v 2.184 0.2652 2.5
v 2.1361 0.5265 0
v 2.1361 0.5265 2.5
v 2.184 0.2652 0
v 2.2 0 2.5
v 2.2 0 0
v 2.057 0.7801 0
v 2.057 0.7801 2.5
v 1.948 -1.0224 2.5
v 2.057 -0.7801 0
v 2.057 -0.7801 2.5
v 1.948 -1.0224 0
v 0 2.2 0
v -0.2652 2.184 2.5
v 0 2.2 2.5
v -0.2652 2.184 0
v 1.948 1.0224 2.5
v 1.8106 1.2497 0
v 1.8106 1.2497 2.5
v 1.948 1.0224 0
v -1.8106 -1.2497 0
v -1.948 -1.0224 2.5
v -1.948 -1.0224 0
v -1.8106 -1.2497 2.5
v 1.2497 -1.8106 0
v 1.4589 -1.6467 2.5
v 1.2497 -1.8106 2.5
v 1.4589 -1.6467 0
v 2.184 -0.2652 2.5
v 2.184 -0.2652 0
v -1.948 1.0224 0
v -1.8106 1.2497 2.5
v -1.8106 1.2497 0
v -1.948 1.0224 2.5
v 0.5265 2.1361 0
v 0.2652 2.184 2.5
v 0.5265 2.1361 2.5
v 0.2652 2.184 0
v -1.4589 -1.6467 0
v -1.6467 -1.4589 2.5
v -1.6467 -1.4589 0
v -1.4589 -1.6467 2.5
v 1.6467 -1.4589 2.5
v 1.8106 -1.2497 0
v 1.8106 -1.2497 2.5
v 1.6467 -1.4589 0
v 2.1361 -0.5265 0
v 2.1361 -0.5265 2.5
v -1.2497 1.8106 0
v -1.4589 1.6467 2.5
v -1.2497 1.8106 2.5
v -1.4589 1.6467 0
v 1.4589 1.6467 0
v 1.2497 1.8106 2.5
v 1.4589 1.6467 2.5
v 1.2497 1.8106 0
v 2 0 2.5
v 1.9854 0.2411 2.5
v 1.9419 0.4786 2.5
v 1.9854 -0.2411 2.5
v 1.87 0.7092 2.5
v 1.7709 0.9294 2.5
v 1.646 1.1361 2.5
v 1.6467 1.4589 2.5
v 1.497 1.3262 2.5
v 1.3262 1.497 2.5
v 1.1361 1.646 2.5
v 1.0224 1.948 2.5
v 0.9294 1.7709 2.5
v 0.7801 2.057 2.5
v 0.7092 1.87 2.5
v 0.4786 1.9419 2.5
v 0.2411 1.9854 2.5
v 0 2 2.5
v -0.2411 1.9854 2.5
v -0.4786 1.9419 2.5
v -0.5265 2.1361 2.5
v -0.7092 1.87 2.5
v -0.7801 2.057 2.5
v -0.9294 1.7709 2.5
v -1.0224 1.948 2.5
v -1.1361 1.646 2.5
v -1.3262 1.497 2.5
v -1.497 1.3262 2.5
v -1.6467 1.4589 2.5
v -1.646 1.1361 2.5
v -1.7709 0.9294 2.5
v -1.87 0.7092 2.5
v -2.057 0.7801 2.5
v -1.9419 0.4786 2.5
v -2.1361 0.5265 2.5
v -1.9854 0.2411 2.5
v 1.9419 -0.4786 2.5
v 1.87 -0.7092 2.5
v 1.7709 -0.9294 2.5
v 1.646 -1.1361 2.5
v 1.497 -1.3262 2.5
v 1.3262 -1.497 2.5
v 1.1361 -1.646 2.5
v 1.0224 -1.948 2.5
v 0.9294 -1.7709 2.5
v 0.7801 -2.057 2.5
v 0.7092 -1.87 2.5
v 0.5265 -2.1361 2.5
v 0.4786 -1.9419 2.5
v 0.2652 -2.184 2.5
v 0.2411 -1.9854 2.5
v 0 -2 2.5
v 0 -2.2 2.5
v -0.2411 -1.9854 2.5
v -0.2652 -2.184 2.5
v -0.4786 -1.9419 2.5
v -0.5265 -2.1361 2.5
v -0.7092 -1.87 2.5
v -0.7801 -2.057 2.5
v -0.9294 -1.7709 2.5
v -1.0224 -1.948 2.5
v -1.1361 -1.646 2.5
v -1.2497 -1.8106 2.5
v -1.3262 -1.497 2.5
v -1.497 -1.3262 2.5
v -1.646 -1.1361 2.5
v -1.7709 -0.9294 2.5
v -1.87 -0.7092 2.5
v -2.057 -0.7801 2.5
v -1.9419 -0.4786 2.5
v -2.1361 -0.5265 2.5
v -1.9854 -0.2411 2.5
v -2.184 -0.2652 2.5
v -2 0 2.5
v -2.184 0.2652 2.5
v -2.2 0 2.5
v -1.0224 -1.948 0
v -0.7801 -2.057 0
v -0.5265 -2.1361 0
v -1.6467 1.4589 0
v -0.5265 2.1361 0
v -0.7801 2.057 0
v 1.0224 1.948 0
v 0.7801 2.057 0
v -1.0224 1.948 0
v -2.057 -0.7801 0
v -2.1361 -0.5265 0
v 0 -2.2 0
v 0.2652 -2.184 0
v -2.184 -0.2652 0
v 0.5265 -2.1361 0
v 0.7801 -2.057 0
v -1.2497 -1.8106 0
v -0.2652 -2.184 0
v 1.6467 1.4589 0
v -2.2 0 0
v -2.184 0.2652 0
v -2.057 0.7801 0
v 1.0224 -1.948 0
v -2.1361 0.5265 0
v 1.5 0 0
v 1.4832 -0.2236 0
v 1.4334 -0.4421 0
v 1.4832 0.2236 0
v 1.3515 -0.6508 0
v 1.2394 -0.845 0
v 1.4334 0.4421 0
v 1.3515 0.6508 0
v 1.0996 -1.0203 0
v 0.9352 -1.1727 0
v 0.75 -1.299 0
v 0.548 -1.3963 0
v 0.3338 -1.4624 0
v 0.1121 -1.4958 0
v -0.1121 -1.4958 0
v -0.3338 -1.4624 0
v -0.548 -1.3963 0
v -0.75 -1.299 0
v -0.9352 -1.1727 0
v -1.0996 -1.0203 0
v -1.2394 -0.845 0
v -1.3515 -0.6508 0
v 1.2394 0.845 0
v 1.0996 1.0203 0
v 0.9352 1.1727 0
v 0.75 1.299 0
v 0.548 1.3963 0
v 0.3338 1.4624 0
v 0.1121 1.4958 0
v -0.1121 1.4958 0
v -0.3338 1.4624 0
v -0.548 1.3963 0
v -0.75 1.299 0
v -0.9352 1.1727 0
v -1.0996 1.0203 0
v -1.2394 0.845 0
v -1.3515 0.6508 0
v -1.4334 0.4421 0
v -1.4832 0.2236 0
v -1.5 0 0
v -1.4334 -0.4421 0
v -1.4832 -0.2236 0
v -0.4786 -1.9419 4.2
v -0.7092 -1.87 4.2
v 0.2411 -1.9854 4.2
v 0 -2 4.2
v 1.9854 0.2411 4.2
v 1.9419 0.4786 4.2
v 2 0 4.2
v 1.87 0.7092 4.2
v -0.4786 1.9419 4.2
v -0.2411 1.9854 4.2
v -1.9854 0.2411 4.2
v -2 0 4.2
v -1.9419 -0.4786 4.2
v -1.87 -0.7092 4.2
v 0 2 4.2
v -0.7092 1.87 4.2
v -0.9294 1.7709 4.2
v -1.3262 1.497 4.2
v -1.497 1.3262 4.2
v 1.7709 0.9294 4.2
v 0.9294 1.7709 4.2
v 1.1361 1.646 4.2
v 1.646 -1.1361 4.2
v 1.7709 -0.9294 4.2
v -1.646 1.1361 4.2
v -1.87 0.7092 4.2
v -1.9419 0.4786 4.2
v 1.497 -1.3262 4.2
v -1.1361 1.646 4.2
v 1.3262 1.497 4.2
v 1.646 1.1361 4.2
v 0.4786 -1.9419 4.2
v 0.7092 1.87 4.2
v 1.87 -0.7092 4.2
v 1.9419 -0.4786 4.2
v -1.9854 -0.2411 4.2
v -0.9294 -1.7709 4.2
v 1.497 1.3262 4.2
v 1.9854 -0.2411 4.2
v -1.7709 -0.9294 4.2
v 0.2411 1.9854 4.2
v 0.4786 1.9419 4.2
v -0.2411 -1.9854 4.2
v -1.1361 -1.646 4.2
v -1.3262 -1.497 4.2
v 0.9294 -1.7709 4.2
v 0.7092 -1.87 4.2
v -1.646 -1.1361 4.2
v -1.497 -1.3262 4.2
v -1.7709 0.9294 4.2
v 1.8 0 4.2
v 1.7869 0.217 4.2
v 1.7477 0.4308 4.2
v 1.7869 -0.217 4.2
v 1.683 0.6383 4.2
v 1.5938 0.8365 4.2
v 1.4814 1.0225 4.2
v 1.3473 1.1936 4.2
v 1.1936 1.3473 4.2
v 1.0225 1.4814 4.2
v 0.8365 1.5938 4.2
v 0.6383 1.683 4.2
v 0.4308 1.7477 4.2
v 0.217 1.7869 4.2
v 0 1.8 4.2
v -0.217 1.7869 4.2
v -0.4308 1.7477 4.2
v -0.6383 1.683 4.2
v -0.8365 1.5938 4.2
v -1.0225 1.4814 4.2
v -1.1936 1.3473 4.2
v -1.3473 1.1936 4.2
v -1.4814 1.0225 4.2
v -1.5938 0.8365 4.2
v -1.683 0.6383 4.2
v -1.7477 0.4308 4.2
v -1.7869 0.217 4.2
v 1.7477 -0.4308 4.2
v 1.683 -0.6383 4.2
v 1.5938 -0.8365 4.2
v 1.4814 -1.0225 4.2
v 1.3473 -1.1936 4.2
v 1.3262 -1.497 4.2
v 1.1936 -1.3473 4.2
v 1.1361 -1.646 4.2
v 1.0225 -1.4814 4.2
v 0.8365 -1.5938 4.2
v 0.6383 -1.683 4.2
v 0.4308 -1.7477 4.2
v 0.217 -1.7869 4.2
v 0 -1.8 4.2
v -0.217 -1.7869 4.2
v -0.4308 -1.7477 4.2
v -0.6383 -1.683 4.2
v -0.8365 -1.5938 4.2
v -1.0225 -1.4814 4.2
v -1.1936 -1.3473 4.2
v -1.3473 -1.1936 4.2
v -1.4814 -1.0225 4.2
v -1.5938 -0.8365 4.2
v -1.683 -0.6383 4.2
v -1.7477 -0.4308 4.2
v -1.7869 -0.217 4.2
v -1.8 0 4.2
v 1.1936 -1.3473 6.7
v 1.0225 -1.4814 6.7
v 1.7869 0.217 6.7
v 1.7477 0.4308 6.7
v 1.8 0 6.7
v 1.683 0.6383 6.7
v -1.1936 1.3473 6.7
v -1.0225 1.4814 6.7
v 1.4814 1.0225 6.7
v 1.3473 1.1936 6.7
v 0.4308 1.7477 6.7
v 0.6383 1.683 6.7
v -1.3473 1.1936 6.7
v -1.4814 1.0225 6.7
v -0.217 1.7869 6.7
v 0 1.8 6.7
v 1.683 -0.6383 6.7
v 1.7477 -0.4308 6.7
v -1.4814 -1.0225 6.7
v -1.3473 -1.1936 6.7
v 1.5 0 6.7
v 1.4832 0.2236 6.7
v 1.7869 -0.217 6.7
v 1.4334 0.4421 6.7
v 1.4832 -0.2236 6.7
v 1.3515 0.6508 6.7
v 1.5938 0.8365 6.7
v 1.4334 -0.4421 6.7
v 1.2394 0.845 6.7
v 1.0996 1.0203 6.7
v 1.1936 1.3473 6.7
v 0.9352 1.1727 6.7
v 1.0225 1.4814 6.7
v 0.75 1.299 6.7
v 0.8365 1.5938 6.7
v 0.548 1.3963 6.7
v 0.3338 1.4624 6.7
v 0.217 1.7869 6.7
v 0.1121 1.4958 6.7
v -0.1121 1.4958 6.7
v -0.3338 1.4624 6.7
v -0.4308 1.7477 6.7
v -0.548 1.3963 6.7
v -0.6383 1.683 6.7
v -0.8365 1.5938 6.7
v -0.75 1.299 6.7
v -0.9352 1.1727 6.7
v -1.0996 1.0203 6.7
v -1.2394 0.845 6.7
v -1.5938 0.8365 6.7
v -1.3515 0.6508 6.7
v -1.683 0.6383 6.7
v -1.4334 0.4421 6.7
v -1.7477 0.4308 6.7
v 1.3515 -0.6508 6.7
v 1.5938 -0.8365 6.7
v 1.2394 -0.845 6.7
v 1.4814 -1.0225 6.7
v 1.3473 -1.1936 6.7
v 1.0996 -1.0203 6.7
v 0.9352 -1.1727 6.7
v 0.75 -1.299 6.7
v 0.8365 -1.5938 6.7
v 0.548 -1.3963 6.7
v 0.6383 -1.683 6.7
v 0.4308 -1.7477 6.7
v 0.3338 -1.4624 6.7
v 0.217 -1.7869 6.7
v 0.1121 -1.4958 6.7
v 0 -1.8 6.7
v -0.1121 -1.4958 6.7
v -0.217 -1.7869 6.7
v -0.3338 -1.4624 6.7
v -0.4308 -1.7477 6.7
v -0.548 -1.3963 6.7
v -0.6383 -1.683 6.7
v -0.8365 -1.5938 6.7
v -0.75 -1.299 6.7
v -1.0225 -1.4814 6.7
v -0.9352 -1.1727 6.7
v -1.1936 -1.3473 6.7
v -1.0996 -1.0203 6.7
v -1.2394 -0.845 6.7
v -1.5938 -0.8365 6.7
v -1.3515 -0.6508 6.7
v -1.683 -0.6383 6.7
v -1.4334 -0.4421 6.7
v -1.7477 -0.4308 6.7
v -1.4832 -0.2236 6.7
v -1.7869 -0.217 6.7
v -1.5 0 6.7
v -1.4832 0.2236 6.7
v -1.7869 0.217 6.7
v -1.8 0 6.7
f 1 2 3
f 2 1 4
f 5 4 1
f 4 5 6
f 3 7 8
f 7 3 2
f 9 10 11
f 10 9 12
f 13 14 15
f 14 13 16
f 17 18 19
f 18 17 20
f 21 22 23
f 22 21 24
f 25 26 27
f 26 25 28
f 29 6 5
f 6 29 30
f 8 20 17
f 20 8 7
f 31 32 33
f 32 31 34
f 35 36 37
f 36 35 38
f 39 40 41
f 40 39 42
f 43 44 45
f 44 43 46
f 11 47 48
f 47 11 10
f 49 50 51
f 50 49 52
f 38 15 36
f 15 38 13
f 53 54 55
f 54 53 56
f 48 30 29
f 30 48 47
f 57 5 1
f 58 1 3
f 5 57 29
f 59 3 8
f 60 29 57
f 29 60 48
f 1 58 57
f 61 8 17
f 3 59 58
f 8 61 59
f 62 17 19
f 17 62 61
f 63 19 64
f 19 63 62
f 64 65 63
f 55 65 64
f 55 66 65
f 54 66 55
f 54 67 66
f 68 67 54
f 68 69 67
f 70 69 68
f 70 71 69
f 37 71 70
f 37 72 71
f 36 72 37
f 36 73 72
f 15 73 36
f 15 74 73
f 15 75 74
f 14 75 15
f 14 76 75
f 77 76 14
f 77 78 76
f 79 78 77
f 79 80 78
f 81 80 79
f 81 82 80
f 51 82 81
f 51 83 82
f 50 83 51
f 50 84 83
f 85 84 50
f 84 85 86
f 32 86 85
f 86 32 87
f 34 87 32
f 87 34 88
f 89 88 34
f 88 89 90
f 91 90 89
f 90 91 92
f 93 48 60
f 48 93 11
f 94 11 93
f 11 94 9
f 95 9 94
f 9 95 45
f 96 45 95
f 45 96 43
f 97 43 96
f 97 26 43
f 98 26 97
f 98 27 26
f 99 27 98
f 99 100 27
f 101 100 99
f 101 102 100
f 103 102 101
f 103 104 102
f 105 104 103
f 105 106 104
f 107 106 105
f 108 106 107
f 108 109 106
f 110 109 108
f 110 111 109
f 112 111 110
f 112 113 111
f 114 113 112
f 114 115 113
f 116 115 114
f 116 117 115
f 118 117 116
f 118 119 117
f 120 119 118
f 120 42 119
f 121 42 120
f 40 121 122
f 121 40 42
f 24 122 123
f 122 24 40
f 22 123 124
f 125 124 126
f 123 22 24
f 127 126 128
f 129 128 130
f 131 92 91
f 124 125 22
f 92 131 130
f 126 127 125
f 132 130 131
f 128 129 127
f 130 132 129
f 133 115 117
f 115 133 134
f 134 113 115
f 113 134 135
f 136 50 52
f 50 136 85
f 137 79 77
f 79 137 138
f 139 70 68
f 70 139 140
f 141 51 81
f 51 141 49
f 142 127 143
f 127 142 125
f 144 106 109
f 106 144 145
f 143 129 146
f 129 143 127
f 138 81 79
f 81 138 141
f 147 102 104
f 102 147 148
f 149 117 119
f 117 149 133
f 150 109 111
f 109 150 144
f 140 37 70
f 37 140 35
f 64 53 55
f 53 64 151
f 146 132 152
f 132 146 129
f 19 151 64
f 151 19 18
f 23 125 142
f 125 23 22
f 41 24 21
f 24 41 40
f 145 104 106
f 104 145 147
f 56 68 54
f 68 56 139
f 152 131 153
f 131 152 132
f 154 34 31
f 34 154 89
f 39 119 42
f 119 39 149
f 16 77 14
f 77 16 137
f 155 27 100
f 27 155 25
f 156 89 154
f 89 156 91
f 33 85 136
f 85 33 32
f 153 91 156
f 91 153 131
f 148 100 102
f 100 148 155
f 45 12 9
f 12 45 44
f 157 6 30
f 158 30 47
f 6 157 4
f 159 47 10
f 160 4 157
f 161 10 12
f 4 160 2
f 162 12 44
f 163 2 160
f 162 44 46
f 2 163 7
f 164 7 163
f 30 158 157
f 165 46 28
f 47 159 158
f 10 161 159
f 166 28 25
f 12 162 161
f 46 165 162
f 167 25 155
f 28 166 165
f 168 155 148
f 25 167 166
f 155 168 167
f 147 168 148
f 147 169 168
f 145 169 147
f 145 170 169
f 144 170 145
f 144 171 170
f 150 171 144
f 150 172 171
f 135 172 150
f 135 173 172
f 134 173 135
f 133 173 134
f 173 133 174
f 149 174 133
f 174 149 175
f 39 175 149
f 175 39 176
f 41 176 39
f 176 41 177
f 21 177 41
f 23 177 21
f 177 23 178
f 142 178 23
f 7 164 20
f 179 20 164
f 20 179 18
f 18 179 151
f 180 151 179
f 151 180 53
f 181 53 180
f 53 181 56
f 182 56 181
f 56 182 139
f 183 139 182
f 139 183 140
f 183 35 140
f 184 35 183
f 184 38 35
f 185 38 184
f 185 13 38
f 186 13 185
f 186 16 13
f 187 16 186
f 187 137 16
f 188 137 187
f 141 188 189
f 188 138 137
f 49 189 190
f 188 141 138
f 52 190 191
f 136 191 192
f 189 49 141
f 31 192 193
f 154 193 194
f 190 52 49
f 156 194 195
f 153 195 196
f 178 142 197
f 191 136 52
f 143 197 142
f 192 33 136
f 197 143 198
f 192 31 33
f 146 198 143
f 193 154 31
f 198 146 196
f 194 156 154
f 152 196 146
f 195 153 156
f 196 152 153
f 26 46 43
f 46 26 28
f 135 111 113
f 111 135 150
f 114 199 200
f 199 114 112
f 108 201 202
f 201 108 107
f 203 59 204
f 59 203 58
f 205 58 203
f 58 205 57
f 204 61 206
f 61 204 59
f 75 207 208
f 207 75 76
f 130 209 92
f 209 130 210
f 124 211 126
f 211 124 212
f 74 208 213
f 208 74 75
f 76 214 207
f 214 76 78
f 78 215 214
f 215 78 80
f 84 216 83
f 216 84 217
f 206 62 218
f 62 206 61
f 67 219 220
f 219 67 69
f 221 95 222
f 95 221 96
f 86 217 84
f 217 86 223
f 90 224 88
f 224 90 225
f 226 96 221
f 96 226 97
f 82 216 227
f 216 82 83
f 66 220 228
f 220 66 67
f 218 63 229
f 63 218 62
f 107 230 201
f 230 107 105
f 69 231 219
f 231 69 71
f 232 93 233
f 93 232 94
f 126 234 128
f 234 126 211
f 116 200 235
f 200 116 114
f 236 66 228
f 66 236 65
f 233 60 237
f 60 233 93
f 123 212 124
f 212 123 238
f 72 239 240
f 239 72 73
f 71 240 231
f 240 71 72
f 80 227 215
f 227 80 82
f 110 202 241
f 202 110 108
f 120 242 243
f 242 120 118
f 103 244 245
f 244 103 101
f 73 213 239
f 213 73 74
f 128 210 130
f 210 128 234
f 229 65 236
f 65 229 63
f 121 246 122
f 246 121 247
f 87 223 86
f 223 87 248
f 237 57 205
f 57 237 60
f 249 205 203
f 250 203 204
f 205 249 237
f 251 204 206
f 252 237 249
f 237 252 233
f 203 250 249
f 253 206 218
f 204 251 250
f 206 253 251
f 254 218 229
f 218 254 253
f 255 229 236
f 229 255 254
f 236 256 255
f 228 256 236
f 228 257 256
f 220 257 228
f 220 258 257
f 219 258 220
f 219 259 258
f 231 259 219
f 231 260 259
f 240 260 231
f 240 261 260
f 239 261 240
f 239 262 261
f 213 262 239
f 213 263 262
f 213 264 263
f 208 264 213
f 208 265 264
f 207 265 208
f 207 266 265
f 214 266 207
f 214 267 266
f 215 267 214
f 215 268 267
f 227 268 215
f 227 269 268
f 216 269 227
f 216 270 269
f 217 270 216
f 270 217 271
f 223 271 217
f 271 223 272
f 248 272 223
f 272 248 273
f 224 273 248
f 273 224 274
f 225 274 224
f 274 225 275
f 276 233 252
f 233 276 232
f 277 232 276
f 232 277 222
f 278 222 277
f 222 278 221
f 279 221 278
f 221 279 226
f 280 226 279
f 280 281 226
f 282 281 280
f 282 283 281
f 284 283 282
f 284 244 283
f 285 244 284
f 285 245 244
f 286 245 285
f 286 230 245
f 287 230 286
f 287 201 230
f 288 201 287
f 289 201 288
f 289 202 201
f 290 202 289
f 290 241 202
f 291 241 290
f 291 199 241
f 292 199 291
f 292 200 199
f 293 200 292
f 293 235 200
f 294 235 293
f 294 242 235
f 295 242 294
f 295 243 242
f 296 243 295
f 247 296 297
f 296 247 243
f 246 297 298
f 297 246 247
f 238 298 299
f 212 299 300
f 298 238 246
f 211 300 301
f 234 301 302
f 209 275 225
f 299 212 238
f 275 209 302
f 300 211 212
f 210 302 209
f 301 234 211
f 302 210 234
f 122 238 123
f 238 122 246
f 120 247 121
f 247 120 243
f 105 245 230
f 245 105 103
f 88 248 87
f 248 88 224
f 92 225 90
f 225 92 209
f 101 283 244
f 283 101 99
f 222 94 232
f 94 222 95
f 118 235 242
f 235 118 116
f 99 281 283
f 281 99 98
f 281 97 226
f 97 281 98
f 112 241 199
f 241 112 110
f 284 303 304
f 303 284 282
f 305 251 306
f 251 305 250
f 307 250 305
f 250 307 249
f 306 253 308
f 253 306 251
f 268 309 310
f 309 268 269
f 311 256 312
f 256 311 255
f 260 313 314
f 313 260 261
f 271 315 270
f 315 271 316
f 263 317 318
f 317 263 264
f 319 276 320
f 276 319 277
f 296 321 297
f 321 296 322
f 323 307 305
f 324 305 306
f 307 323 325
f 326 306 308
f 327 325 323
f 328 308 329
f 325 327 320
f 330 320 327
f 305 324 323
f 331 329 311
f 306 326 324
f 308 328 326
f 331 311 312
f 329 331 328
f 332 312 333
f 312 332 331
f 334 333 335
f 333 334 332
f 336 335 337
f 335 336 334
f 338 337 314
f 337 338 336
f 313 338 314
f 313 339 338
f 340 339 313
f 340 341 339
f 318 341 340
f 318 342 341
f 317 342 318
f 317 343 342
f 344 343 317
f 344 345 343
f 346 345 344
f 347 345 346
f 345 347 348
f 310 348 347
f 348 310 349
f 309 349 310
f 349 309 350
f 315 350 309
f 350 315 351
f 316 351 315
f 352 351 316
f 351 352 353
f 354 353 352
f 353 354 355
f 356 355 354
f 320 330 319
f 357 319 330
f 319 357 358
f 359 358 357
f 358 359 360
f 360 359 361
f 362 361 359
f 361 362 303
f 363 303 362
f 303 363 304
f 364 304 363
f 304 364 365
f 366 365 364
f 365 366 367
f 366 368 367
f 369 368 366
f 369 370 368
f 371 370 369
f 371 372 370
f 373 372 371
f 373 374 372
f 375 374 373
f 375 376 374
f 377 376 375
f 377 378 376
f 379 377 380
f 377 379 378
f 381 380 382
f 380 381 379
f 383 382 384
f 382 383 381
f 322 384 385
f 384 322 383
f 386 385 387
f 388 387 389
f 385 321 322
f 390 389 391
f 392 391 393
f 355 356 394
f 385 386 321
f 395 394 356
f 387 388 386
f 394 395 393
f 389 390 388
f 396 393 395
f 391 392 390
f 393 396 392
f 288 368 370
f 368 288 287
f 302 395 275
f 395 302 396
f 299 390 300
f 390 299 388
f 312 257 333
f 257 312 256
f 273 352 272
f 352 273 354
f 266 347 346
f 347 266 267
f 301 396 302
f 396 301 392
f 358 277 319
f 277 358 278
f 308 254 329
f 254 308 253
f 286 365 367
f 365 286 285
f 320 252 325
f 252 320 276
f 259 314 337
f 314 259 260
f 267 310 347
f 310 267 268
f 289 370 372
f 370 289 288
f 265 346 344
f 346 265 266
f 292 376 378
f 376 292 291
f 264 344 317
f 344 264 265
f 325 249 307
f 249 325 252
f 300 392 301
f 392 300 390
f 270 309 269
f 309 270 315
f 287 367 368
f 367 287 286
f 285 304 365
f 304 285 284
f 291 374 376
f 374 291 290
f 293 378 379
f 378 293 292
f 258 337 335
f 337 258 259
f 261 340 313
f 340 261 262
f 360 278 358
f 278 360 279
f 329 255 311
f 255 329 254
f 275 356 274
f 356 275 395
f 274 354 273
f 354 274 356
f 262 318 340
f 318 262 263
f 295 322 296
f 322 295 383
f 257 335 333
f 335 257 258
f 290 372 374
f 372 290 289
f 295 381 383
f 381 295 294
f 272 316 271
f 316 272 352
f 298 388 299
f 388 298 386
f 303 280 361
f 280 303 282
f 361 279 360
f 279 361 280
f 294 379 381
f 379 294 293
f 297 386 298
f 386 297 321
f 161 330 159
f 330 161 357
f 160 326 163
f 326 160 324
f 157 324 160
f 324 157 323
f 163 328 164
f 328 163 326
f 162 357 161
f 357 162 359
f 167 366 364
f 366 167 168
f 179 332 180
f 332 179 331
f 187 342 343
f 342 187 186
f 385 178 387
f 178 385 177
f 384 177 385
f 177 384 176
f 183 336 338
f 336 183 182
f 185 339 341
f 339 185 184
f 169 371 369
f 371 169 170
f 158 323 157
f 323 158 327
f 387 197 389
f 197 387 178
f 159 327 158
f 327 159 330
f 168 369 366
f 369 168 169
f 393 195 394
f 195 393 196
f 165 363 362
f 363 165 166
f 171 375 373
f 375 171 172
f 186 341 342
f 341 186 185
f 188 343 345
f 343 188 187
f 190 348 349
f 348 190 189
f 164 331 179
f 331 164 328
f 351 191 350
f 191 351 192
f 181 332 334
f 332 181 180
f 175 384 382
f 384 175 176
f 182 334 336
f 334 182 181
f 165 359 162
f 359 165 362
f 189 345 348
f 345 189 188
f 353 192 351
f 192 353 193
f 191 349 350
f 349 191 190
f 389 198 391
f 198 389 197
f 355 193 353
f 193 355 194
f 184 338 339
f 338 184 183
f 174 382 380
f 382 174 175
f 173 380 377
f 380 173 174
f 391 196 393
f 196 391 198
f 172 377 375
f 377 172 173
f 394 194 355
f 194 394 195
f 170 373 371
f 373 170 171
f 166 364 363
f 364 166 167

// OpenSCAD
// part_id: mar9
// name: Mars stepped hub
// source_drawing_ids: DRW-013
// units: mm
// revision: 0.1
// SPDX-License-Identifier: MIT

module part_mar9(
    base_d = 4.4,
    mid_d = 4.0,
    top_d = 3.6,
    total_h = 6.7,
    base_h = 2.5,
    mid_h = 1.7,
    top_h = 2.5,
    bore_d = 3.0
) {
    difference() {
        union() {
            cylinder(d = base_d, h = base_h, center = false, $fn = 52);
            translate([0, 0, base_h]) cylinder(d = mid_d, h = mid_h, center = false, $fn = 52);
            translate([0, 0, base_h + mid_h]) cylinder(d = top_d, h = top_h, center = false, $fn = 52);
        }
        translate([0, 0, -0.05]) cylinder(d = bore_d, h = total_h + 0.1, center = false, $fn = 42);
    }
}

// ---- "main guard" ----
if (is_undef(__LIB_MODE__)) {
    part_mar9();
}
